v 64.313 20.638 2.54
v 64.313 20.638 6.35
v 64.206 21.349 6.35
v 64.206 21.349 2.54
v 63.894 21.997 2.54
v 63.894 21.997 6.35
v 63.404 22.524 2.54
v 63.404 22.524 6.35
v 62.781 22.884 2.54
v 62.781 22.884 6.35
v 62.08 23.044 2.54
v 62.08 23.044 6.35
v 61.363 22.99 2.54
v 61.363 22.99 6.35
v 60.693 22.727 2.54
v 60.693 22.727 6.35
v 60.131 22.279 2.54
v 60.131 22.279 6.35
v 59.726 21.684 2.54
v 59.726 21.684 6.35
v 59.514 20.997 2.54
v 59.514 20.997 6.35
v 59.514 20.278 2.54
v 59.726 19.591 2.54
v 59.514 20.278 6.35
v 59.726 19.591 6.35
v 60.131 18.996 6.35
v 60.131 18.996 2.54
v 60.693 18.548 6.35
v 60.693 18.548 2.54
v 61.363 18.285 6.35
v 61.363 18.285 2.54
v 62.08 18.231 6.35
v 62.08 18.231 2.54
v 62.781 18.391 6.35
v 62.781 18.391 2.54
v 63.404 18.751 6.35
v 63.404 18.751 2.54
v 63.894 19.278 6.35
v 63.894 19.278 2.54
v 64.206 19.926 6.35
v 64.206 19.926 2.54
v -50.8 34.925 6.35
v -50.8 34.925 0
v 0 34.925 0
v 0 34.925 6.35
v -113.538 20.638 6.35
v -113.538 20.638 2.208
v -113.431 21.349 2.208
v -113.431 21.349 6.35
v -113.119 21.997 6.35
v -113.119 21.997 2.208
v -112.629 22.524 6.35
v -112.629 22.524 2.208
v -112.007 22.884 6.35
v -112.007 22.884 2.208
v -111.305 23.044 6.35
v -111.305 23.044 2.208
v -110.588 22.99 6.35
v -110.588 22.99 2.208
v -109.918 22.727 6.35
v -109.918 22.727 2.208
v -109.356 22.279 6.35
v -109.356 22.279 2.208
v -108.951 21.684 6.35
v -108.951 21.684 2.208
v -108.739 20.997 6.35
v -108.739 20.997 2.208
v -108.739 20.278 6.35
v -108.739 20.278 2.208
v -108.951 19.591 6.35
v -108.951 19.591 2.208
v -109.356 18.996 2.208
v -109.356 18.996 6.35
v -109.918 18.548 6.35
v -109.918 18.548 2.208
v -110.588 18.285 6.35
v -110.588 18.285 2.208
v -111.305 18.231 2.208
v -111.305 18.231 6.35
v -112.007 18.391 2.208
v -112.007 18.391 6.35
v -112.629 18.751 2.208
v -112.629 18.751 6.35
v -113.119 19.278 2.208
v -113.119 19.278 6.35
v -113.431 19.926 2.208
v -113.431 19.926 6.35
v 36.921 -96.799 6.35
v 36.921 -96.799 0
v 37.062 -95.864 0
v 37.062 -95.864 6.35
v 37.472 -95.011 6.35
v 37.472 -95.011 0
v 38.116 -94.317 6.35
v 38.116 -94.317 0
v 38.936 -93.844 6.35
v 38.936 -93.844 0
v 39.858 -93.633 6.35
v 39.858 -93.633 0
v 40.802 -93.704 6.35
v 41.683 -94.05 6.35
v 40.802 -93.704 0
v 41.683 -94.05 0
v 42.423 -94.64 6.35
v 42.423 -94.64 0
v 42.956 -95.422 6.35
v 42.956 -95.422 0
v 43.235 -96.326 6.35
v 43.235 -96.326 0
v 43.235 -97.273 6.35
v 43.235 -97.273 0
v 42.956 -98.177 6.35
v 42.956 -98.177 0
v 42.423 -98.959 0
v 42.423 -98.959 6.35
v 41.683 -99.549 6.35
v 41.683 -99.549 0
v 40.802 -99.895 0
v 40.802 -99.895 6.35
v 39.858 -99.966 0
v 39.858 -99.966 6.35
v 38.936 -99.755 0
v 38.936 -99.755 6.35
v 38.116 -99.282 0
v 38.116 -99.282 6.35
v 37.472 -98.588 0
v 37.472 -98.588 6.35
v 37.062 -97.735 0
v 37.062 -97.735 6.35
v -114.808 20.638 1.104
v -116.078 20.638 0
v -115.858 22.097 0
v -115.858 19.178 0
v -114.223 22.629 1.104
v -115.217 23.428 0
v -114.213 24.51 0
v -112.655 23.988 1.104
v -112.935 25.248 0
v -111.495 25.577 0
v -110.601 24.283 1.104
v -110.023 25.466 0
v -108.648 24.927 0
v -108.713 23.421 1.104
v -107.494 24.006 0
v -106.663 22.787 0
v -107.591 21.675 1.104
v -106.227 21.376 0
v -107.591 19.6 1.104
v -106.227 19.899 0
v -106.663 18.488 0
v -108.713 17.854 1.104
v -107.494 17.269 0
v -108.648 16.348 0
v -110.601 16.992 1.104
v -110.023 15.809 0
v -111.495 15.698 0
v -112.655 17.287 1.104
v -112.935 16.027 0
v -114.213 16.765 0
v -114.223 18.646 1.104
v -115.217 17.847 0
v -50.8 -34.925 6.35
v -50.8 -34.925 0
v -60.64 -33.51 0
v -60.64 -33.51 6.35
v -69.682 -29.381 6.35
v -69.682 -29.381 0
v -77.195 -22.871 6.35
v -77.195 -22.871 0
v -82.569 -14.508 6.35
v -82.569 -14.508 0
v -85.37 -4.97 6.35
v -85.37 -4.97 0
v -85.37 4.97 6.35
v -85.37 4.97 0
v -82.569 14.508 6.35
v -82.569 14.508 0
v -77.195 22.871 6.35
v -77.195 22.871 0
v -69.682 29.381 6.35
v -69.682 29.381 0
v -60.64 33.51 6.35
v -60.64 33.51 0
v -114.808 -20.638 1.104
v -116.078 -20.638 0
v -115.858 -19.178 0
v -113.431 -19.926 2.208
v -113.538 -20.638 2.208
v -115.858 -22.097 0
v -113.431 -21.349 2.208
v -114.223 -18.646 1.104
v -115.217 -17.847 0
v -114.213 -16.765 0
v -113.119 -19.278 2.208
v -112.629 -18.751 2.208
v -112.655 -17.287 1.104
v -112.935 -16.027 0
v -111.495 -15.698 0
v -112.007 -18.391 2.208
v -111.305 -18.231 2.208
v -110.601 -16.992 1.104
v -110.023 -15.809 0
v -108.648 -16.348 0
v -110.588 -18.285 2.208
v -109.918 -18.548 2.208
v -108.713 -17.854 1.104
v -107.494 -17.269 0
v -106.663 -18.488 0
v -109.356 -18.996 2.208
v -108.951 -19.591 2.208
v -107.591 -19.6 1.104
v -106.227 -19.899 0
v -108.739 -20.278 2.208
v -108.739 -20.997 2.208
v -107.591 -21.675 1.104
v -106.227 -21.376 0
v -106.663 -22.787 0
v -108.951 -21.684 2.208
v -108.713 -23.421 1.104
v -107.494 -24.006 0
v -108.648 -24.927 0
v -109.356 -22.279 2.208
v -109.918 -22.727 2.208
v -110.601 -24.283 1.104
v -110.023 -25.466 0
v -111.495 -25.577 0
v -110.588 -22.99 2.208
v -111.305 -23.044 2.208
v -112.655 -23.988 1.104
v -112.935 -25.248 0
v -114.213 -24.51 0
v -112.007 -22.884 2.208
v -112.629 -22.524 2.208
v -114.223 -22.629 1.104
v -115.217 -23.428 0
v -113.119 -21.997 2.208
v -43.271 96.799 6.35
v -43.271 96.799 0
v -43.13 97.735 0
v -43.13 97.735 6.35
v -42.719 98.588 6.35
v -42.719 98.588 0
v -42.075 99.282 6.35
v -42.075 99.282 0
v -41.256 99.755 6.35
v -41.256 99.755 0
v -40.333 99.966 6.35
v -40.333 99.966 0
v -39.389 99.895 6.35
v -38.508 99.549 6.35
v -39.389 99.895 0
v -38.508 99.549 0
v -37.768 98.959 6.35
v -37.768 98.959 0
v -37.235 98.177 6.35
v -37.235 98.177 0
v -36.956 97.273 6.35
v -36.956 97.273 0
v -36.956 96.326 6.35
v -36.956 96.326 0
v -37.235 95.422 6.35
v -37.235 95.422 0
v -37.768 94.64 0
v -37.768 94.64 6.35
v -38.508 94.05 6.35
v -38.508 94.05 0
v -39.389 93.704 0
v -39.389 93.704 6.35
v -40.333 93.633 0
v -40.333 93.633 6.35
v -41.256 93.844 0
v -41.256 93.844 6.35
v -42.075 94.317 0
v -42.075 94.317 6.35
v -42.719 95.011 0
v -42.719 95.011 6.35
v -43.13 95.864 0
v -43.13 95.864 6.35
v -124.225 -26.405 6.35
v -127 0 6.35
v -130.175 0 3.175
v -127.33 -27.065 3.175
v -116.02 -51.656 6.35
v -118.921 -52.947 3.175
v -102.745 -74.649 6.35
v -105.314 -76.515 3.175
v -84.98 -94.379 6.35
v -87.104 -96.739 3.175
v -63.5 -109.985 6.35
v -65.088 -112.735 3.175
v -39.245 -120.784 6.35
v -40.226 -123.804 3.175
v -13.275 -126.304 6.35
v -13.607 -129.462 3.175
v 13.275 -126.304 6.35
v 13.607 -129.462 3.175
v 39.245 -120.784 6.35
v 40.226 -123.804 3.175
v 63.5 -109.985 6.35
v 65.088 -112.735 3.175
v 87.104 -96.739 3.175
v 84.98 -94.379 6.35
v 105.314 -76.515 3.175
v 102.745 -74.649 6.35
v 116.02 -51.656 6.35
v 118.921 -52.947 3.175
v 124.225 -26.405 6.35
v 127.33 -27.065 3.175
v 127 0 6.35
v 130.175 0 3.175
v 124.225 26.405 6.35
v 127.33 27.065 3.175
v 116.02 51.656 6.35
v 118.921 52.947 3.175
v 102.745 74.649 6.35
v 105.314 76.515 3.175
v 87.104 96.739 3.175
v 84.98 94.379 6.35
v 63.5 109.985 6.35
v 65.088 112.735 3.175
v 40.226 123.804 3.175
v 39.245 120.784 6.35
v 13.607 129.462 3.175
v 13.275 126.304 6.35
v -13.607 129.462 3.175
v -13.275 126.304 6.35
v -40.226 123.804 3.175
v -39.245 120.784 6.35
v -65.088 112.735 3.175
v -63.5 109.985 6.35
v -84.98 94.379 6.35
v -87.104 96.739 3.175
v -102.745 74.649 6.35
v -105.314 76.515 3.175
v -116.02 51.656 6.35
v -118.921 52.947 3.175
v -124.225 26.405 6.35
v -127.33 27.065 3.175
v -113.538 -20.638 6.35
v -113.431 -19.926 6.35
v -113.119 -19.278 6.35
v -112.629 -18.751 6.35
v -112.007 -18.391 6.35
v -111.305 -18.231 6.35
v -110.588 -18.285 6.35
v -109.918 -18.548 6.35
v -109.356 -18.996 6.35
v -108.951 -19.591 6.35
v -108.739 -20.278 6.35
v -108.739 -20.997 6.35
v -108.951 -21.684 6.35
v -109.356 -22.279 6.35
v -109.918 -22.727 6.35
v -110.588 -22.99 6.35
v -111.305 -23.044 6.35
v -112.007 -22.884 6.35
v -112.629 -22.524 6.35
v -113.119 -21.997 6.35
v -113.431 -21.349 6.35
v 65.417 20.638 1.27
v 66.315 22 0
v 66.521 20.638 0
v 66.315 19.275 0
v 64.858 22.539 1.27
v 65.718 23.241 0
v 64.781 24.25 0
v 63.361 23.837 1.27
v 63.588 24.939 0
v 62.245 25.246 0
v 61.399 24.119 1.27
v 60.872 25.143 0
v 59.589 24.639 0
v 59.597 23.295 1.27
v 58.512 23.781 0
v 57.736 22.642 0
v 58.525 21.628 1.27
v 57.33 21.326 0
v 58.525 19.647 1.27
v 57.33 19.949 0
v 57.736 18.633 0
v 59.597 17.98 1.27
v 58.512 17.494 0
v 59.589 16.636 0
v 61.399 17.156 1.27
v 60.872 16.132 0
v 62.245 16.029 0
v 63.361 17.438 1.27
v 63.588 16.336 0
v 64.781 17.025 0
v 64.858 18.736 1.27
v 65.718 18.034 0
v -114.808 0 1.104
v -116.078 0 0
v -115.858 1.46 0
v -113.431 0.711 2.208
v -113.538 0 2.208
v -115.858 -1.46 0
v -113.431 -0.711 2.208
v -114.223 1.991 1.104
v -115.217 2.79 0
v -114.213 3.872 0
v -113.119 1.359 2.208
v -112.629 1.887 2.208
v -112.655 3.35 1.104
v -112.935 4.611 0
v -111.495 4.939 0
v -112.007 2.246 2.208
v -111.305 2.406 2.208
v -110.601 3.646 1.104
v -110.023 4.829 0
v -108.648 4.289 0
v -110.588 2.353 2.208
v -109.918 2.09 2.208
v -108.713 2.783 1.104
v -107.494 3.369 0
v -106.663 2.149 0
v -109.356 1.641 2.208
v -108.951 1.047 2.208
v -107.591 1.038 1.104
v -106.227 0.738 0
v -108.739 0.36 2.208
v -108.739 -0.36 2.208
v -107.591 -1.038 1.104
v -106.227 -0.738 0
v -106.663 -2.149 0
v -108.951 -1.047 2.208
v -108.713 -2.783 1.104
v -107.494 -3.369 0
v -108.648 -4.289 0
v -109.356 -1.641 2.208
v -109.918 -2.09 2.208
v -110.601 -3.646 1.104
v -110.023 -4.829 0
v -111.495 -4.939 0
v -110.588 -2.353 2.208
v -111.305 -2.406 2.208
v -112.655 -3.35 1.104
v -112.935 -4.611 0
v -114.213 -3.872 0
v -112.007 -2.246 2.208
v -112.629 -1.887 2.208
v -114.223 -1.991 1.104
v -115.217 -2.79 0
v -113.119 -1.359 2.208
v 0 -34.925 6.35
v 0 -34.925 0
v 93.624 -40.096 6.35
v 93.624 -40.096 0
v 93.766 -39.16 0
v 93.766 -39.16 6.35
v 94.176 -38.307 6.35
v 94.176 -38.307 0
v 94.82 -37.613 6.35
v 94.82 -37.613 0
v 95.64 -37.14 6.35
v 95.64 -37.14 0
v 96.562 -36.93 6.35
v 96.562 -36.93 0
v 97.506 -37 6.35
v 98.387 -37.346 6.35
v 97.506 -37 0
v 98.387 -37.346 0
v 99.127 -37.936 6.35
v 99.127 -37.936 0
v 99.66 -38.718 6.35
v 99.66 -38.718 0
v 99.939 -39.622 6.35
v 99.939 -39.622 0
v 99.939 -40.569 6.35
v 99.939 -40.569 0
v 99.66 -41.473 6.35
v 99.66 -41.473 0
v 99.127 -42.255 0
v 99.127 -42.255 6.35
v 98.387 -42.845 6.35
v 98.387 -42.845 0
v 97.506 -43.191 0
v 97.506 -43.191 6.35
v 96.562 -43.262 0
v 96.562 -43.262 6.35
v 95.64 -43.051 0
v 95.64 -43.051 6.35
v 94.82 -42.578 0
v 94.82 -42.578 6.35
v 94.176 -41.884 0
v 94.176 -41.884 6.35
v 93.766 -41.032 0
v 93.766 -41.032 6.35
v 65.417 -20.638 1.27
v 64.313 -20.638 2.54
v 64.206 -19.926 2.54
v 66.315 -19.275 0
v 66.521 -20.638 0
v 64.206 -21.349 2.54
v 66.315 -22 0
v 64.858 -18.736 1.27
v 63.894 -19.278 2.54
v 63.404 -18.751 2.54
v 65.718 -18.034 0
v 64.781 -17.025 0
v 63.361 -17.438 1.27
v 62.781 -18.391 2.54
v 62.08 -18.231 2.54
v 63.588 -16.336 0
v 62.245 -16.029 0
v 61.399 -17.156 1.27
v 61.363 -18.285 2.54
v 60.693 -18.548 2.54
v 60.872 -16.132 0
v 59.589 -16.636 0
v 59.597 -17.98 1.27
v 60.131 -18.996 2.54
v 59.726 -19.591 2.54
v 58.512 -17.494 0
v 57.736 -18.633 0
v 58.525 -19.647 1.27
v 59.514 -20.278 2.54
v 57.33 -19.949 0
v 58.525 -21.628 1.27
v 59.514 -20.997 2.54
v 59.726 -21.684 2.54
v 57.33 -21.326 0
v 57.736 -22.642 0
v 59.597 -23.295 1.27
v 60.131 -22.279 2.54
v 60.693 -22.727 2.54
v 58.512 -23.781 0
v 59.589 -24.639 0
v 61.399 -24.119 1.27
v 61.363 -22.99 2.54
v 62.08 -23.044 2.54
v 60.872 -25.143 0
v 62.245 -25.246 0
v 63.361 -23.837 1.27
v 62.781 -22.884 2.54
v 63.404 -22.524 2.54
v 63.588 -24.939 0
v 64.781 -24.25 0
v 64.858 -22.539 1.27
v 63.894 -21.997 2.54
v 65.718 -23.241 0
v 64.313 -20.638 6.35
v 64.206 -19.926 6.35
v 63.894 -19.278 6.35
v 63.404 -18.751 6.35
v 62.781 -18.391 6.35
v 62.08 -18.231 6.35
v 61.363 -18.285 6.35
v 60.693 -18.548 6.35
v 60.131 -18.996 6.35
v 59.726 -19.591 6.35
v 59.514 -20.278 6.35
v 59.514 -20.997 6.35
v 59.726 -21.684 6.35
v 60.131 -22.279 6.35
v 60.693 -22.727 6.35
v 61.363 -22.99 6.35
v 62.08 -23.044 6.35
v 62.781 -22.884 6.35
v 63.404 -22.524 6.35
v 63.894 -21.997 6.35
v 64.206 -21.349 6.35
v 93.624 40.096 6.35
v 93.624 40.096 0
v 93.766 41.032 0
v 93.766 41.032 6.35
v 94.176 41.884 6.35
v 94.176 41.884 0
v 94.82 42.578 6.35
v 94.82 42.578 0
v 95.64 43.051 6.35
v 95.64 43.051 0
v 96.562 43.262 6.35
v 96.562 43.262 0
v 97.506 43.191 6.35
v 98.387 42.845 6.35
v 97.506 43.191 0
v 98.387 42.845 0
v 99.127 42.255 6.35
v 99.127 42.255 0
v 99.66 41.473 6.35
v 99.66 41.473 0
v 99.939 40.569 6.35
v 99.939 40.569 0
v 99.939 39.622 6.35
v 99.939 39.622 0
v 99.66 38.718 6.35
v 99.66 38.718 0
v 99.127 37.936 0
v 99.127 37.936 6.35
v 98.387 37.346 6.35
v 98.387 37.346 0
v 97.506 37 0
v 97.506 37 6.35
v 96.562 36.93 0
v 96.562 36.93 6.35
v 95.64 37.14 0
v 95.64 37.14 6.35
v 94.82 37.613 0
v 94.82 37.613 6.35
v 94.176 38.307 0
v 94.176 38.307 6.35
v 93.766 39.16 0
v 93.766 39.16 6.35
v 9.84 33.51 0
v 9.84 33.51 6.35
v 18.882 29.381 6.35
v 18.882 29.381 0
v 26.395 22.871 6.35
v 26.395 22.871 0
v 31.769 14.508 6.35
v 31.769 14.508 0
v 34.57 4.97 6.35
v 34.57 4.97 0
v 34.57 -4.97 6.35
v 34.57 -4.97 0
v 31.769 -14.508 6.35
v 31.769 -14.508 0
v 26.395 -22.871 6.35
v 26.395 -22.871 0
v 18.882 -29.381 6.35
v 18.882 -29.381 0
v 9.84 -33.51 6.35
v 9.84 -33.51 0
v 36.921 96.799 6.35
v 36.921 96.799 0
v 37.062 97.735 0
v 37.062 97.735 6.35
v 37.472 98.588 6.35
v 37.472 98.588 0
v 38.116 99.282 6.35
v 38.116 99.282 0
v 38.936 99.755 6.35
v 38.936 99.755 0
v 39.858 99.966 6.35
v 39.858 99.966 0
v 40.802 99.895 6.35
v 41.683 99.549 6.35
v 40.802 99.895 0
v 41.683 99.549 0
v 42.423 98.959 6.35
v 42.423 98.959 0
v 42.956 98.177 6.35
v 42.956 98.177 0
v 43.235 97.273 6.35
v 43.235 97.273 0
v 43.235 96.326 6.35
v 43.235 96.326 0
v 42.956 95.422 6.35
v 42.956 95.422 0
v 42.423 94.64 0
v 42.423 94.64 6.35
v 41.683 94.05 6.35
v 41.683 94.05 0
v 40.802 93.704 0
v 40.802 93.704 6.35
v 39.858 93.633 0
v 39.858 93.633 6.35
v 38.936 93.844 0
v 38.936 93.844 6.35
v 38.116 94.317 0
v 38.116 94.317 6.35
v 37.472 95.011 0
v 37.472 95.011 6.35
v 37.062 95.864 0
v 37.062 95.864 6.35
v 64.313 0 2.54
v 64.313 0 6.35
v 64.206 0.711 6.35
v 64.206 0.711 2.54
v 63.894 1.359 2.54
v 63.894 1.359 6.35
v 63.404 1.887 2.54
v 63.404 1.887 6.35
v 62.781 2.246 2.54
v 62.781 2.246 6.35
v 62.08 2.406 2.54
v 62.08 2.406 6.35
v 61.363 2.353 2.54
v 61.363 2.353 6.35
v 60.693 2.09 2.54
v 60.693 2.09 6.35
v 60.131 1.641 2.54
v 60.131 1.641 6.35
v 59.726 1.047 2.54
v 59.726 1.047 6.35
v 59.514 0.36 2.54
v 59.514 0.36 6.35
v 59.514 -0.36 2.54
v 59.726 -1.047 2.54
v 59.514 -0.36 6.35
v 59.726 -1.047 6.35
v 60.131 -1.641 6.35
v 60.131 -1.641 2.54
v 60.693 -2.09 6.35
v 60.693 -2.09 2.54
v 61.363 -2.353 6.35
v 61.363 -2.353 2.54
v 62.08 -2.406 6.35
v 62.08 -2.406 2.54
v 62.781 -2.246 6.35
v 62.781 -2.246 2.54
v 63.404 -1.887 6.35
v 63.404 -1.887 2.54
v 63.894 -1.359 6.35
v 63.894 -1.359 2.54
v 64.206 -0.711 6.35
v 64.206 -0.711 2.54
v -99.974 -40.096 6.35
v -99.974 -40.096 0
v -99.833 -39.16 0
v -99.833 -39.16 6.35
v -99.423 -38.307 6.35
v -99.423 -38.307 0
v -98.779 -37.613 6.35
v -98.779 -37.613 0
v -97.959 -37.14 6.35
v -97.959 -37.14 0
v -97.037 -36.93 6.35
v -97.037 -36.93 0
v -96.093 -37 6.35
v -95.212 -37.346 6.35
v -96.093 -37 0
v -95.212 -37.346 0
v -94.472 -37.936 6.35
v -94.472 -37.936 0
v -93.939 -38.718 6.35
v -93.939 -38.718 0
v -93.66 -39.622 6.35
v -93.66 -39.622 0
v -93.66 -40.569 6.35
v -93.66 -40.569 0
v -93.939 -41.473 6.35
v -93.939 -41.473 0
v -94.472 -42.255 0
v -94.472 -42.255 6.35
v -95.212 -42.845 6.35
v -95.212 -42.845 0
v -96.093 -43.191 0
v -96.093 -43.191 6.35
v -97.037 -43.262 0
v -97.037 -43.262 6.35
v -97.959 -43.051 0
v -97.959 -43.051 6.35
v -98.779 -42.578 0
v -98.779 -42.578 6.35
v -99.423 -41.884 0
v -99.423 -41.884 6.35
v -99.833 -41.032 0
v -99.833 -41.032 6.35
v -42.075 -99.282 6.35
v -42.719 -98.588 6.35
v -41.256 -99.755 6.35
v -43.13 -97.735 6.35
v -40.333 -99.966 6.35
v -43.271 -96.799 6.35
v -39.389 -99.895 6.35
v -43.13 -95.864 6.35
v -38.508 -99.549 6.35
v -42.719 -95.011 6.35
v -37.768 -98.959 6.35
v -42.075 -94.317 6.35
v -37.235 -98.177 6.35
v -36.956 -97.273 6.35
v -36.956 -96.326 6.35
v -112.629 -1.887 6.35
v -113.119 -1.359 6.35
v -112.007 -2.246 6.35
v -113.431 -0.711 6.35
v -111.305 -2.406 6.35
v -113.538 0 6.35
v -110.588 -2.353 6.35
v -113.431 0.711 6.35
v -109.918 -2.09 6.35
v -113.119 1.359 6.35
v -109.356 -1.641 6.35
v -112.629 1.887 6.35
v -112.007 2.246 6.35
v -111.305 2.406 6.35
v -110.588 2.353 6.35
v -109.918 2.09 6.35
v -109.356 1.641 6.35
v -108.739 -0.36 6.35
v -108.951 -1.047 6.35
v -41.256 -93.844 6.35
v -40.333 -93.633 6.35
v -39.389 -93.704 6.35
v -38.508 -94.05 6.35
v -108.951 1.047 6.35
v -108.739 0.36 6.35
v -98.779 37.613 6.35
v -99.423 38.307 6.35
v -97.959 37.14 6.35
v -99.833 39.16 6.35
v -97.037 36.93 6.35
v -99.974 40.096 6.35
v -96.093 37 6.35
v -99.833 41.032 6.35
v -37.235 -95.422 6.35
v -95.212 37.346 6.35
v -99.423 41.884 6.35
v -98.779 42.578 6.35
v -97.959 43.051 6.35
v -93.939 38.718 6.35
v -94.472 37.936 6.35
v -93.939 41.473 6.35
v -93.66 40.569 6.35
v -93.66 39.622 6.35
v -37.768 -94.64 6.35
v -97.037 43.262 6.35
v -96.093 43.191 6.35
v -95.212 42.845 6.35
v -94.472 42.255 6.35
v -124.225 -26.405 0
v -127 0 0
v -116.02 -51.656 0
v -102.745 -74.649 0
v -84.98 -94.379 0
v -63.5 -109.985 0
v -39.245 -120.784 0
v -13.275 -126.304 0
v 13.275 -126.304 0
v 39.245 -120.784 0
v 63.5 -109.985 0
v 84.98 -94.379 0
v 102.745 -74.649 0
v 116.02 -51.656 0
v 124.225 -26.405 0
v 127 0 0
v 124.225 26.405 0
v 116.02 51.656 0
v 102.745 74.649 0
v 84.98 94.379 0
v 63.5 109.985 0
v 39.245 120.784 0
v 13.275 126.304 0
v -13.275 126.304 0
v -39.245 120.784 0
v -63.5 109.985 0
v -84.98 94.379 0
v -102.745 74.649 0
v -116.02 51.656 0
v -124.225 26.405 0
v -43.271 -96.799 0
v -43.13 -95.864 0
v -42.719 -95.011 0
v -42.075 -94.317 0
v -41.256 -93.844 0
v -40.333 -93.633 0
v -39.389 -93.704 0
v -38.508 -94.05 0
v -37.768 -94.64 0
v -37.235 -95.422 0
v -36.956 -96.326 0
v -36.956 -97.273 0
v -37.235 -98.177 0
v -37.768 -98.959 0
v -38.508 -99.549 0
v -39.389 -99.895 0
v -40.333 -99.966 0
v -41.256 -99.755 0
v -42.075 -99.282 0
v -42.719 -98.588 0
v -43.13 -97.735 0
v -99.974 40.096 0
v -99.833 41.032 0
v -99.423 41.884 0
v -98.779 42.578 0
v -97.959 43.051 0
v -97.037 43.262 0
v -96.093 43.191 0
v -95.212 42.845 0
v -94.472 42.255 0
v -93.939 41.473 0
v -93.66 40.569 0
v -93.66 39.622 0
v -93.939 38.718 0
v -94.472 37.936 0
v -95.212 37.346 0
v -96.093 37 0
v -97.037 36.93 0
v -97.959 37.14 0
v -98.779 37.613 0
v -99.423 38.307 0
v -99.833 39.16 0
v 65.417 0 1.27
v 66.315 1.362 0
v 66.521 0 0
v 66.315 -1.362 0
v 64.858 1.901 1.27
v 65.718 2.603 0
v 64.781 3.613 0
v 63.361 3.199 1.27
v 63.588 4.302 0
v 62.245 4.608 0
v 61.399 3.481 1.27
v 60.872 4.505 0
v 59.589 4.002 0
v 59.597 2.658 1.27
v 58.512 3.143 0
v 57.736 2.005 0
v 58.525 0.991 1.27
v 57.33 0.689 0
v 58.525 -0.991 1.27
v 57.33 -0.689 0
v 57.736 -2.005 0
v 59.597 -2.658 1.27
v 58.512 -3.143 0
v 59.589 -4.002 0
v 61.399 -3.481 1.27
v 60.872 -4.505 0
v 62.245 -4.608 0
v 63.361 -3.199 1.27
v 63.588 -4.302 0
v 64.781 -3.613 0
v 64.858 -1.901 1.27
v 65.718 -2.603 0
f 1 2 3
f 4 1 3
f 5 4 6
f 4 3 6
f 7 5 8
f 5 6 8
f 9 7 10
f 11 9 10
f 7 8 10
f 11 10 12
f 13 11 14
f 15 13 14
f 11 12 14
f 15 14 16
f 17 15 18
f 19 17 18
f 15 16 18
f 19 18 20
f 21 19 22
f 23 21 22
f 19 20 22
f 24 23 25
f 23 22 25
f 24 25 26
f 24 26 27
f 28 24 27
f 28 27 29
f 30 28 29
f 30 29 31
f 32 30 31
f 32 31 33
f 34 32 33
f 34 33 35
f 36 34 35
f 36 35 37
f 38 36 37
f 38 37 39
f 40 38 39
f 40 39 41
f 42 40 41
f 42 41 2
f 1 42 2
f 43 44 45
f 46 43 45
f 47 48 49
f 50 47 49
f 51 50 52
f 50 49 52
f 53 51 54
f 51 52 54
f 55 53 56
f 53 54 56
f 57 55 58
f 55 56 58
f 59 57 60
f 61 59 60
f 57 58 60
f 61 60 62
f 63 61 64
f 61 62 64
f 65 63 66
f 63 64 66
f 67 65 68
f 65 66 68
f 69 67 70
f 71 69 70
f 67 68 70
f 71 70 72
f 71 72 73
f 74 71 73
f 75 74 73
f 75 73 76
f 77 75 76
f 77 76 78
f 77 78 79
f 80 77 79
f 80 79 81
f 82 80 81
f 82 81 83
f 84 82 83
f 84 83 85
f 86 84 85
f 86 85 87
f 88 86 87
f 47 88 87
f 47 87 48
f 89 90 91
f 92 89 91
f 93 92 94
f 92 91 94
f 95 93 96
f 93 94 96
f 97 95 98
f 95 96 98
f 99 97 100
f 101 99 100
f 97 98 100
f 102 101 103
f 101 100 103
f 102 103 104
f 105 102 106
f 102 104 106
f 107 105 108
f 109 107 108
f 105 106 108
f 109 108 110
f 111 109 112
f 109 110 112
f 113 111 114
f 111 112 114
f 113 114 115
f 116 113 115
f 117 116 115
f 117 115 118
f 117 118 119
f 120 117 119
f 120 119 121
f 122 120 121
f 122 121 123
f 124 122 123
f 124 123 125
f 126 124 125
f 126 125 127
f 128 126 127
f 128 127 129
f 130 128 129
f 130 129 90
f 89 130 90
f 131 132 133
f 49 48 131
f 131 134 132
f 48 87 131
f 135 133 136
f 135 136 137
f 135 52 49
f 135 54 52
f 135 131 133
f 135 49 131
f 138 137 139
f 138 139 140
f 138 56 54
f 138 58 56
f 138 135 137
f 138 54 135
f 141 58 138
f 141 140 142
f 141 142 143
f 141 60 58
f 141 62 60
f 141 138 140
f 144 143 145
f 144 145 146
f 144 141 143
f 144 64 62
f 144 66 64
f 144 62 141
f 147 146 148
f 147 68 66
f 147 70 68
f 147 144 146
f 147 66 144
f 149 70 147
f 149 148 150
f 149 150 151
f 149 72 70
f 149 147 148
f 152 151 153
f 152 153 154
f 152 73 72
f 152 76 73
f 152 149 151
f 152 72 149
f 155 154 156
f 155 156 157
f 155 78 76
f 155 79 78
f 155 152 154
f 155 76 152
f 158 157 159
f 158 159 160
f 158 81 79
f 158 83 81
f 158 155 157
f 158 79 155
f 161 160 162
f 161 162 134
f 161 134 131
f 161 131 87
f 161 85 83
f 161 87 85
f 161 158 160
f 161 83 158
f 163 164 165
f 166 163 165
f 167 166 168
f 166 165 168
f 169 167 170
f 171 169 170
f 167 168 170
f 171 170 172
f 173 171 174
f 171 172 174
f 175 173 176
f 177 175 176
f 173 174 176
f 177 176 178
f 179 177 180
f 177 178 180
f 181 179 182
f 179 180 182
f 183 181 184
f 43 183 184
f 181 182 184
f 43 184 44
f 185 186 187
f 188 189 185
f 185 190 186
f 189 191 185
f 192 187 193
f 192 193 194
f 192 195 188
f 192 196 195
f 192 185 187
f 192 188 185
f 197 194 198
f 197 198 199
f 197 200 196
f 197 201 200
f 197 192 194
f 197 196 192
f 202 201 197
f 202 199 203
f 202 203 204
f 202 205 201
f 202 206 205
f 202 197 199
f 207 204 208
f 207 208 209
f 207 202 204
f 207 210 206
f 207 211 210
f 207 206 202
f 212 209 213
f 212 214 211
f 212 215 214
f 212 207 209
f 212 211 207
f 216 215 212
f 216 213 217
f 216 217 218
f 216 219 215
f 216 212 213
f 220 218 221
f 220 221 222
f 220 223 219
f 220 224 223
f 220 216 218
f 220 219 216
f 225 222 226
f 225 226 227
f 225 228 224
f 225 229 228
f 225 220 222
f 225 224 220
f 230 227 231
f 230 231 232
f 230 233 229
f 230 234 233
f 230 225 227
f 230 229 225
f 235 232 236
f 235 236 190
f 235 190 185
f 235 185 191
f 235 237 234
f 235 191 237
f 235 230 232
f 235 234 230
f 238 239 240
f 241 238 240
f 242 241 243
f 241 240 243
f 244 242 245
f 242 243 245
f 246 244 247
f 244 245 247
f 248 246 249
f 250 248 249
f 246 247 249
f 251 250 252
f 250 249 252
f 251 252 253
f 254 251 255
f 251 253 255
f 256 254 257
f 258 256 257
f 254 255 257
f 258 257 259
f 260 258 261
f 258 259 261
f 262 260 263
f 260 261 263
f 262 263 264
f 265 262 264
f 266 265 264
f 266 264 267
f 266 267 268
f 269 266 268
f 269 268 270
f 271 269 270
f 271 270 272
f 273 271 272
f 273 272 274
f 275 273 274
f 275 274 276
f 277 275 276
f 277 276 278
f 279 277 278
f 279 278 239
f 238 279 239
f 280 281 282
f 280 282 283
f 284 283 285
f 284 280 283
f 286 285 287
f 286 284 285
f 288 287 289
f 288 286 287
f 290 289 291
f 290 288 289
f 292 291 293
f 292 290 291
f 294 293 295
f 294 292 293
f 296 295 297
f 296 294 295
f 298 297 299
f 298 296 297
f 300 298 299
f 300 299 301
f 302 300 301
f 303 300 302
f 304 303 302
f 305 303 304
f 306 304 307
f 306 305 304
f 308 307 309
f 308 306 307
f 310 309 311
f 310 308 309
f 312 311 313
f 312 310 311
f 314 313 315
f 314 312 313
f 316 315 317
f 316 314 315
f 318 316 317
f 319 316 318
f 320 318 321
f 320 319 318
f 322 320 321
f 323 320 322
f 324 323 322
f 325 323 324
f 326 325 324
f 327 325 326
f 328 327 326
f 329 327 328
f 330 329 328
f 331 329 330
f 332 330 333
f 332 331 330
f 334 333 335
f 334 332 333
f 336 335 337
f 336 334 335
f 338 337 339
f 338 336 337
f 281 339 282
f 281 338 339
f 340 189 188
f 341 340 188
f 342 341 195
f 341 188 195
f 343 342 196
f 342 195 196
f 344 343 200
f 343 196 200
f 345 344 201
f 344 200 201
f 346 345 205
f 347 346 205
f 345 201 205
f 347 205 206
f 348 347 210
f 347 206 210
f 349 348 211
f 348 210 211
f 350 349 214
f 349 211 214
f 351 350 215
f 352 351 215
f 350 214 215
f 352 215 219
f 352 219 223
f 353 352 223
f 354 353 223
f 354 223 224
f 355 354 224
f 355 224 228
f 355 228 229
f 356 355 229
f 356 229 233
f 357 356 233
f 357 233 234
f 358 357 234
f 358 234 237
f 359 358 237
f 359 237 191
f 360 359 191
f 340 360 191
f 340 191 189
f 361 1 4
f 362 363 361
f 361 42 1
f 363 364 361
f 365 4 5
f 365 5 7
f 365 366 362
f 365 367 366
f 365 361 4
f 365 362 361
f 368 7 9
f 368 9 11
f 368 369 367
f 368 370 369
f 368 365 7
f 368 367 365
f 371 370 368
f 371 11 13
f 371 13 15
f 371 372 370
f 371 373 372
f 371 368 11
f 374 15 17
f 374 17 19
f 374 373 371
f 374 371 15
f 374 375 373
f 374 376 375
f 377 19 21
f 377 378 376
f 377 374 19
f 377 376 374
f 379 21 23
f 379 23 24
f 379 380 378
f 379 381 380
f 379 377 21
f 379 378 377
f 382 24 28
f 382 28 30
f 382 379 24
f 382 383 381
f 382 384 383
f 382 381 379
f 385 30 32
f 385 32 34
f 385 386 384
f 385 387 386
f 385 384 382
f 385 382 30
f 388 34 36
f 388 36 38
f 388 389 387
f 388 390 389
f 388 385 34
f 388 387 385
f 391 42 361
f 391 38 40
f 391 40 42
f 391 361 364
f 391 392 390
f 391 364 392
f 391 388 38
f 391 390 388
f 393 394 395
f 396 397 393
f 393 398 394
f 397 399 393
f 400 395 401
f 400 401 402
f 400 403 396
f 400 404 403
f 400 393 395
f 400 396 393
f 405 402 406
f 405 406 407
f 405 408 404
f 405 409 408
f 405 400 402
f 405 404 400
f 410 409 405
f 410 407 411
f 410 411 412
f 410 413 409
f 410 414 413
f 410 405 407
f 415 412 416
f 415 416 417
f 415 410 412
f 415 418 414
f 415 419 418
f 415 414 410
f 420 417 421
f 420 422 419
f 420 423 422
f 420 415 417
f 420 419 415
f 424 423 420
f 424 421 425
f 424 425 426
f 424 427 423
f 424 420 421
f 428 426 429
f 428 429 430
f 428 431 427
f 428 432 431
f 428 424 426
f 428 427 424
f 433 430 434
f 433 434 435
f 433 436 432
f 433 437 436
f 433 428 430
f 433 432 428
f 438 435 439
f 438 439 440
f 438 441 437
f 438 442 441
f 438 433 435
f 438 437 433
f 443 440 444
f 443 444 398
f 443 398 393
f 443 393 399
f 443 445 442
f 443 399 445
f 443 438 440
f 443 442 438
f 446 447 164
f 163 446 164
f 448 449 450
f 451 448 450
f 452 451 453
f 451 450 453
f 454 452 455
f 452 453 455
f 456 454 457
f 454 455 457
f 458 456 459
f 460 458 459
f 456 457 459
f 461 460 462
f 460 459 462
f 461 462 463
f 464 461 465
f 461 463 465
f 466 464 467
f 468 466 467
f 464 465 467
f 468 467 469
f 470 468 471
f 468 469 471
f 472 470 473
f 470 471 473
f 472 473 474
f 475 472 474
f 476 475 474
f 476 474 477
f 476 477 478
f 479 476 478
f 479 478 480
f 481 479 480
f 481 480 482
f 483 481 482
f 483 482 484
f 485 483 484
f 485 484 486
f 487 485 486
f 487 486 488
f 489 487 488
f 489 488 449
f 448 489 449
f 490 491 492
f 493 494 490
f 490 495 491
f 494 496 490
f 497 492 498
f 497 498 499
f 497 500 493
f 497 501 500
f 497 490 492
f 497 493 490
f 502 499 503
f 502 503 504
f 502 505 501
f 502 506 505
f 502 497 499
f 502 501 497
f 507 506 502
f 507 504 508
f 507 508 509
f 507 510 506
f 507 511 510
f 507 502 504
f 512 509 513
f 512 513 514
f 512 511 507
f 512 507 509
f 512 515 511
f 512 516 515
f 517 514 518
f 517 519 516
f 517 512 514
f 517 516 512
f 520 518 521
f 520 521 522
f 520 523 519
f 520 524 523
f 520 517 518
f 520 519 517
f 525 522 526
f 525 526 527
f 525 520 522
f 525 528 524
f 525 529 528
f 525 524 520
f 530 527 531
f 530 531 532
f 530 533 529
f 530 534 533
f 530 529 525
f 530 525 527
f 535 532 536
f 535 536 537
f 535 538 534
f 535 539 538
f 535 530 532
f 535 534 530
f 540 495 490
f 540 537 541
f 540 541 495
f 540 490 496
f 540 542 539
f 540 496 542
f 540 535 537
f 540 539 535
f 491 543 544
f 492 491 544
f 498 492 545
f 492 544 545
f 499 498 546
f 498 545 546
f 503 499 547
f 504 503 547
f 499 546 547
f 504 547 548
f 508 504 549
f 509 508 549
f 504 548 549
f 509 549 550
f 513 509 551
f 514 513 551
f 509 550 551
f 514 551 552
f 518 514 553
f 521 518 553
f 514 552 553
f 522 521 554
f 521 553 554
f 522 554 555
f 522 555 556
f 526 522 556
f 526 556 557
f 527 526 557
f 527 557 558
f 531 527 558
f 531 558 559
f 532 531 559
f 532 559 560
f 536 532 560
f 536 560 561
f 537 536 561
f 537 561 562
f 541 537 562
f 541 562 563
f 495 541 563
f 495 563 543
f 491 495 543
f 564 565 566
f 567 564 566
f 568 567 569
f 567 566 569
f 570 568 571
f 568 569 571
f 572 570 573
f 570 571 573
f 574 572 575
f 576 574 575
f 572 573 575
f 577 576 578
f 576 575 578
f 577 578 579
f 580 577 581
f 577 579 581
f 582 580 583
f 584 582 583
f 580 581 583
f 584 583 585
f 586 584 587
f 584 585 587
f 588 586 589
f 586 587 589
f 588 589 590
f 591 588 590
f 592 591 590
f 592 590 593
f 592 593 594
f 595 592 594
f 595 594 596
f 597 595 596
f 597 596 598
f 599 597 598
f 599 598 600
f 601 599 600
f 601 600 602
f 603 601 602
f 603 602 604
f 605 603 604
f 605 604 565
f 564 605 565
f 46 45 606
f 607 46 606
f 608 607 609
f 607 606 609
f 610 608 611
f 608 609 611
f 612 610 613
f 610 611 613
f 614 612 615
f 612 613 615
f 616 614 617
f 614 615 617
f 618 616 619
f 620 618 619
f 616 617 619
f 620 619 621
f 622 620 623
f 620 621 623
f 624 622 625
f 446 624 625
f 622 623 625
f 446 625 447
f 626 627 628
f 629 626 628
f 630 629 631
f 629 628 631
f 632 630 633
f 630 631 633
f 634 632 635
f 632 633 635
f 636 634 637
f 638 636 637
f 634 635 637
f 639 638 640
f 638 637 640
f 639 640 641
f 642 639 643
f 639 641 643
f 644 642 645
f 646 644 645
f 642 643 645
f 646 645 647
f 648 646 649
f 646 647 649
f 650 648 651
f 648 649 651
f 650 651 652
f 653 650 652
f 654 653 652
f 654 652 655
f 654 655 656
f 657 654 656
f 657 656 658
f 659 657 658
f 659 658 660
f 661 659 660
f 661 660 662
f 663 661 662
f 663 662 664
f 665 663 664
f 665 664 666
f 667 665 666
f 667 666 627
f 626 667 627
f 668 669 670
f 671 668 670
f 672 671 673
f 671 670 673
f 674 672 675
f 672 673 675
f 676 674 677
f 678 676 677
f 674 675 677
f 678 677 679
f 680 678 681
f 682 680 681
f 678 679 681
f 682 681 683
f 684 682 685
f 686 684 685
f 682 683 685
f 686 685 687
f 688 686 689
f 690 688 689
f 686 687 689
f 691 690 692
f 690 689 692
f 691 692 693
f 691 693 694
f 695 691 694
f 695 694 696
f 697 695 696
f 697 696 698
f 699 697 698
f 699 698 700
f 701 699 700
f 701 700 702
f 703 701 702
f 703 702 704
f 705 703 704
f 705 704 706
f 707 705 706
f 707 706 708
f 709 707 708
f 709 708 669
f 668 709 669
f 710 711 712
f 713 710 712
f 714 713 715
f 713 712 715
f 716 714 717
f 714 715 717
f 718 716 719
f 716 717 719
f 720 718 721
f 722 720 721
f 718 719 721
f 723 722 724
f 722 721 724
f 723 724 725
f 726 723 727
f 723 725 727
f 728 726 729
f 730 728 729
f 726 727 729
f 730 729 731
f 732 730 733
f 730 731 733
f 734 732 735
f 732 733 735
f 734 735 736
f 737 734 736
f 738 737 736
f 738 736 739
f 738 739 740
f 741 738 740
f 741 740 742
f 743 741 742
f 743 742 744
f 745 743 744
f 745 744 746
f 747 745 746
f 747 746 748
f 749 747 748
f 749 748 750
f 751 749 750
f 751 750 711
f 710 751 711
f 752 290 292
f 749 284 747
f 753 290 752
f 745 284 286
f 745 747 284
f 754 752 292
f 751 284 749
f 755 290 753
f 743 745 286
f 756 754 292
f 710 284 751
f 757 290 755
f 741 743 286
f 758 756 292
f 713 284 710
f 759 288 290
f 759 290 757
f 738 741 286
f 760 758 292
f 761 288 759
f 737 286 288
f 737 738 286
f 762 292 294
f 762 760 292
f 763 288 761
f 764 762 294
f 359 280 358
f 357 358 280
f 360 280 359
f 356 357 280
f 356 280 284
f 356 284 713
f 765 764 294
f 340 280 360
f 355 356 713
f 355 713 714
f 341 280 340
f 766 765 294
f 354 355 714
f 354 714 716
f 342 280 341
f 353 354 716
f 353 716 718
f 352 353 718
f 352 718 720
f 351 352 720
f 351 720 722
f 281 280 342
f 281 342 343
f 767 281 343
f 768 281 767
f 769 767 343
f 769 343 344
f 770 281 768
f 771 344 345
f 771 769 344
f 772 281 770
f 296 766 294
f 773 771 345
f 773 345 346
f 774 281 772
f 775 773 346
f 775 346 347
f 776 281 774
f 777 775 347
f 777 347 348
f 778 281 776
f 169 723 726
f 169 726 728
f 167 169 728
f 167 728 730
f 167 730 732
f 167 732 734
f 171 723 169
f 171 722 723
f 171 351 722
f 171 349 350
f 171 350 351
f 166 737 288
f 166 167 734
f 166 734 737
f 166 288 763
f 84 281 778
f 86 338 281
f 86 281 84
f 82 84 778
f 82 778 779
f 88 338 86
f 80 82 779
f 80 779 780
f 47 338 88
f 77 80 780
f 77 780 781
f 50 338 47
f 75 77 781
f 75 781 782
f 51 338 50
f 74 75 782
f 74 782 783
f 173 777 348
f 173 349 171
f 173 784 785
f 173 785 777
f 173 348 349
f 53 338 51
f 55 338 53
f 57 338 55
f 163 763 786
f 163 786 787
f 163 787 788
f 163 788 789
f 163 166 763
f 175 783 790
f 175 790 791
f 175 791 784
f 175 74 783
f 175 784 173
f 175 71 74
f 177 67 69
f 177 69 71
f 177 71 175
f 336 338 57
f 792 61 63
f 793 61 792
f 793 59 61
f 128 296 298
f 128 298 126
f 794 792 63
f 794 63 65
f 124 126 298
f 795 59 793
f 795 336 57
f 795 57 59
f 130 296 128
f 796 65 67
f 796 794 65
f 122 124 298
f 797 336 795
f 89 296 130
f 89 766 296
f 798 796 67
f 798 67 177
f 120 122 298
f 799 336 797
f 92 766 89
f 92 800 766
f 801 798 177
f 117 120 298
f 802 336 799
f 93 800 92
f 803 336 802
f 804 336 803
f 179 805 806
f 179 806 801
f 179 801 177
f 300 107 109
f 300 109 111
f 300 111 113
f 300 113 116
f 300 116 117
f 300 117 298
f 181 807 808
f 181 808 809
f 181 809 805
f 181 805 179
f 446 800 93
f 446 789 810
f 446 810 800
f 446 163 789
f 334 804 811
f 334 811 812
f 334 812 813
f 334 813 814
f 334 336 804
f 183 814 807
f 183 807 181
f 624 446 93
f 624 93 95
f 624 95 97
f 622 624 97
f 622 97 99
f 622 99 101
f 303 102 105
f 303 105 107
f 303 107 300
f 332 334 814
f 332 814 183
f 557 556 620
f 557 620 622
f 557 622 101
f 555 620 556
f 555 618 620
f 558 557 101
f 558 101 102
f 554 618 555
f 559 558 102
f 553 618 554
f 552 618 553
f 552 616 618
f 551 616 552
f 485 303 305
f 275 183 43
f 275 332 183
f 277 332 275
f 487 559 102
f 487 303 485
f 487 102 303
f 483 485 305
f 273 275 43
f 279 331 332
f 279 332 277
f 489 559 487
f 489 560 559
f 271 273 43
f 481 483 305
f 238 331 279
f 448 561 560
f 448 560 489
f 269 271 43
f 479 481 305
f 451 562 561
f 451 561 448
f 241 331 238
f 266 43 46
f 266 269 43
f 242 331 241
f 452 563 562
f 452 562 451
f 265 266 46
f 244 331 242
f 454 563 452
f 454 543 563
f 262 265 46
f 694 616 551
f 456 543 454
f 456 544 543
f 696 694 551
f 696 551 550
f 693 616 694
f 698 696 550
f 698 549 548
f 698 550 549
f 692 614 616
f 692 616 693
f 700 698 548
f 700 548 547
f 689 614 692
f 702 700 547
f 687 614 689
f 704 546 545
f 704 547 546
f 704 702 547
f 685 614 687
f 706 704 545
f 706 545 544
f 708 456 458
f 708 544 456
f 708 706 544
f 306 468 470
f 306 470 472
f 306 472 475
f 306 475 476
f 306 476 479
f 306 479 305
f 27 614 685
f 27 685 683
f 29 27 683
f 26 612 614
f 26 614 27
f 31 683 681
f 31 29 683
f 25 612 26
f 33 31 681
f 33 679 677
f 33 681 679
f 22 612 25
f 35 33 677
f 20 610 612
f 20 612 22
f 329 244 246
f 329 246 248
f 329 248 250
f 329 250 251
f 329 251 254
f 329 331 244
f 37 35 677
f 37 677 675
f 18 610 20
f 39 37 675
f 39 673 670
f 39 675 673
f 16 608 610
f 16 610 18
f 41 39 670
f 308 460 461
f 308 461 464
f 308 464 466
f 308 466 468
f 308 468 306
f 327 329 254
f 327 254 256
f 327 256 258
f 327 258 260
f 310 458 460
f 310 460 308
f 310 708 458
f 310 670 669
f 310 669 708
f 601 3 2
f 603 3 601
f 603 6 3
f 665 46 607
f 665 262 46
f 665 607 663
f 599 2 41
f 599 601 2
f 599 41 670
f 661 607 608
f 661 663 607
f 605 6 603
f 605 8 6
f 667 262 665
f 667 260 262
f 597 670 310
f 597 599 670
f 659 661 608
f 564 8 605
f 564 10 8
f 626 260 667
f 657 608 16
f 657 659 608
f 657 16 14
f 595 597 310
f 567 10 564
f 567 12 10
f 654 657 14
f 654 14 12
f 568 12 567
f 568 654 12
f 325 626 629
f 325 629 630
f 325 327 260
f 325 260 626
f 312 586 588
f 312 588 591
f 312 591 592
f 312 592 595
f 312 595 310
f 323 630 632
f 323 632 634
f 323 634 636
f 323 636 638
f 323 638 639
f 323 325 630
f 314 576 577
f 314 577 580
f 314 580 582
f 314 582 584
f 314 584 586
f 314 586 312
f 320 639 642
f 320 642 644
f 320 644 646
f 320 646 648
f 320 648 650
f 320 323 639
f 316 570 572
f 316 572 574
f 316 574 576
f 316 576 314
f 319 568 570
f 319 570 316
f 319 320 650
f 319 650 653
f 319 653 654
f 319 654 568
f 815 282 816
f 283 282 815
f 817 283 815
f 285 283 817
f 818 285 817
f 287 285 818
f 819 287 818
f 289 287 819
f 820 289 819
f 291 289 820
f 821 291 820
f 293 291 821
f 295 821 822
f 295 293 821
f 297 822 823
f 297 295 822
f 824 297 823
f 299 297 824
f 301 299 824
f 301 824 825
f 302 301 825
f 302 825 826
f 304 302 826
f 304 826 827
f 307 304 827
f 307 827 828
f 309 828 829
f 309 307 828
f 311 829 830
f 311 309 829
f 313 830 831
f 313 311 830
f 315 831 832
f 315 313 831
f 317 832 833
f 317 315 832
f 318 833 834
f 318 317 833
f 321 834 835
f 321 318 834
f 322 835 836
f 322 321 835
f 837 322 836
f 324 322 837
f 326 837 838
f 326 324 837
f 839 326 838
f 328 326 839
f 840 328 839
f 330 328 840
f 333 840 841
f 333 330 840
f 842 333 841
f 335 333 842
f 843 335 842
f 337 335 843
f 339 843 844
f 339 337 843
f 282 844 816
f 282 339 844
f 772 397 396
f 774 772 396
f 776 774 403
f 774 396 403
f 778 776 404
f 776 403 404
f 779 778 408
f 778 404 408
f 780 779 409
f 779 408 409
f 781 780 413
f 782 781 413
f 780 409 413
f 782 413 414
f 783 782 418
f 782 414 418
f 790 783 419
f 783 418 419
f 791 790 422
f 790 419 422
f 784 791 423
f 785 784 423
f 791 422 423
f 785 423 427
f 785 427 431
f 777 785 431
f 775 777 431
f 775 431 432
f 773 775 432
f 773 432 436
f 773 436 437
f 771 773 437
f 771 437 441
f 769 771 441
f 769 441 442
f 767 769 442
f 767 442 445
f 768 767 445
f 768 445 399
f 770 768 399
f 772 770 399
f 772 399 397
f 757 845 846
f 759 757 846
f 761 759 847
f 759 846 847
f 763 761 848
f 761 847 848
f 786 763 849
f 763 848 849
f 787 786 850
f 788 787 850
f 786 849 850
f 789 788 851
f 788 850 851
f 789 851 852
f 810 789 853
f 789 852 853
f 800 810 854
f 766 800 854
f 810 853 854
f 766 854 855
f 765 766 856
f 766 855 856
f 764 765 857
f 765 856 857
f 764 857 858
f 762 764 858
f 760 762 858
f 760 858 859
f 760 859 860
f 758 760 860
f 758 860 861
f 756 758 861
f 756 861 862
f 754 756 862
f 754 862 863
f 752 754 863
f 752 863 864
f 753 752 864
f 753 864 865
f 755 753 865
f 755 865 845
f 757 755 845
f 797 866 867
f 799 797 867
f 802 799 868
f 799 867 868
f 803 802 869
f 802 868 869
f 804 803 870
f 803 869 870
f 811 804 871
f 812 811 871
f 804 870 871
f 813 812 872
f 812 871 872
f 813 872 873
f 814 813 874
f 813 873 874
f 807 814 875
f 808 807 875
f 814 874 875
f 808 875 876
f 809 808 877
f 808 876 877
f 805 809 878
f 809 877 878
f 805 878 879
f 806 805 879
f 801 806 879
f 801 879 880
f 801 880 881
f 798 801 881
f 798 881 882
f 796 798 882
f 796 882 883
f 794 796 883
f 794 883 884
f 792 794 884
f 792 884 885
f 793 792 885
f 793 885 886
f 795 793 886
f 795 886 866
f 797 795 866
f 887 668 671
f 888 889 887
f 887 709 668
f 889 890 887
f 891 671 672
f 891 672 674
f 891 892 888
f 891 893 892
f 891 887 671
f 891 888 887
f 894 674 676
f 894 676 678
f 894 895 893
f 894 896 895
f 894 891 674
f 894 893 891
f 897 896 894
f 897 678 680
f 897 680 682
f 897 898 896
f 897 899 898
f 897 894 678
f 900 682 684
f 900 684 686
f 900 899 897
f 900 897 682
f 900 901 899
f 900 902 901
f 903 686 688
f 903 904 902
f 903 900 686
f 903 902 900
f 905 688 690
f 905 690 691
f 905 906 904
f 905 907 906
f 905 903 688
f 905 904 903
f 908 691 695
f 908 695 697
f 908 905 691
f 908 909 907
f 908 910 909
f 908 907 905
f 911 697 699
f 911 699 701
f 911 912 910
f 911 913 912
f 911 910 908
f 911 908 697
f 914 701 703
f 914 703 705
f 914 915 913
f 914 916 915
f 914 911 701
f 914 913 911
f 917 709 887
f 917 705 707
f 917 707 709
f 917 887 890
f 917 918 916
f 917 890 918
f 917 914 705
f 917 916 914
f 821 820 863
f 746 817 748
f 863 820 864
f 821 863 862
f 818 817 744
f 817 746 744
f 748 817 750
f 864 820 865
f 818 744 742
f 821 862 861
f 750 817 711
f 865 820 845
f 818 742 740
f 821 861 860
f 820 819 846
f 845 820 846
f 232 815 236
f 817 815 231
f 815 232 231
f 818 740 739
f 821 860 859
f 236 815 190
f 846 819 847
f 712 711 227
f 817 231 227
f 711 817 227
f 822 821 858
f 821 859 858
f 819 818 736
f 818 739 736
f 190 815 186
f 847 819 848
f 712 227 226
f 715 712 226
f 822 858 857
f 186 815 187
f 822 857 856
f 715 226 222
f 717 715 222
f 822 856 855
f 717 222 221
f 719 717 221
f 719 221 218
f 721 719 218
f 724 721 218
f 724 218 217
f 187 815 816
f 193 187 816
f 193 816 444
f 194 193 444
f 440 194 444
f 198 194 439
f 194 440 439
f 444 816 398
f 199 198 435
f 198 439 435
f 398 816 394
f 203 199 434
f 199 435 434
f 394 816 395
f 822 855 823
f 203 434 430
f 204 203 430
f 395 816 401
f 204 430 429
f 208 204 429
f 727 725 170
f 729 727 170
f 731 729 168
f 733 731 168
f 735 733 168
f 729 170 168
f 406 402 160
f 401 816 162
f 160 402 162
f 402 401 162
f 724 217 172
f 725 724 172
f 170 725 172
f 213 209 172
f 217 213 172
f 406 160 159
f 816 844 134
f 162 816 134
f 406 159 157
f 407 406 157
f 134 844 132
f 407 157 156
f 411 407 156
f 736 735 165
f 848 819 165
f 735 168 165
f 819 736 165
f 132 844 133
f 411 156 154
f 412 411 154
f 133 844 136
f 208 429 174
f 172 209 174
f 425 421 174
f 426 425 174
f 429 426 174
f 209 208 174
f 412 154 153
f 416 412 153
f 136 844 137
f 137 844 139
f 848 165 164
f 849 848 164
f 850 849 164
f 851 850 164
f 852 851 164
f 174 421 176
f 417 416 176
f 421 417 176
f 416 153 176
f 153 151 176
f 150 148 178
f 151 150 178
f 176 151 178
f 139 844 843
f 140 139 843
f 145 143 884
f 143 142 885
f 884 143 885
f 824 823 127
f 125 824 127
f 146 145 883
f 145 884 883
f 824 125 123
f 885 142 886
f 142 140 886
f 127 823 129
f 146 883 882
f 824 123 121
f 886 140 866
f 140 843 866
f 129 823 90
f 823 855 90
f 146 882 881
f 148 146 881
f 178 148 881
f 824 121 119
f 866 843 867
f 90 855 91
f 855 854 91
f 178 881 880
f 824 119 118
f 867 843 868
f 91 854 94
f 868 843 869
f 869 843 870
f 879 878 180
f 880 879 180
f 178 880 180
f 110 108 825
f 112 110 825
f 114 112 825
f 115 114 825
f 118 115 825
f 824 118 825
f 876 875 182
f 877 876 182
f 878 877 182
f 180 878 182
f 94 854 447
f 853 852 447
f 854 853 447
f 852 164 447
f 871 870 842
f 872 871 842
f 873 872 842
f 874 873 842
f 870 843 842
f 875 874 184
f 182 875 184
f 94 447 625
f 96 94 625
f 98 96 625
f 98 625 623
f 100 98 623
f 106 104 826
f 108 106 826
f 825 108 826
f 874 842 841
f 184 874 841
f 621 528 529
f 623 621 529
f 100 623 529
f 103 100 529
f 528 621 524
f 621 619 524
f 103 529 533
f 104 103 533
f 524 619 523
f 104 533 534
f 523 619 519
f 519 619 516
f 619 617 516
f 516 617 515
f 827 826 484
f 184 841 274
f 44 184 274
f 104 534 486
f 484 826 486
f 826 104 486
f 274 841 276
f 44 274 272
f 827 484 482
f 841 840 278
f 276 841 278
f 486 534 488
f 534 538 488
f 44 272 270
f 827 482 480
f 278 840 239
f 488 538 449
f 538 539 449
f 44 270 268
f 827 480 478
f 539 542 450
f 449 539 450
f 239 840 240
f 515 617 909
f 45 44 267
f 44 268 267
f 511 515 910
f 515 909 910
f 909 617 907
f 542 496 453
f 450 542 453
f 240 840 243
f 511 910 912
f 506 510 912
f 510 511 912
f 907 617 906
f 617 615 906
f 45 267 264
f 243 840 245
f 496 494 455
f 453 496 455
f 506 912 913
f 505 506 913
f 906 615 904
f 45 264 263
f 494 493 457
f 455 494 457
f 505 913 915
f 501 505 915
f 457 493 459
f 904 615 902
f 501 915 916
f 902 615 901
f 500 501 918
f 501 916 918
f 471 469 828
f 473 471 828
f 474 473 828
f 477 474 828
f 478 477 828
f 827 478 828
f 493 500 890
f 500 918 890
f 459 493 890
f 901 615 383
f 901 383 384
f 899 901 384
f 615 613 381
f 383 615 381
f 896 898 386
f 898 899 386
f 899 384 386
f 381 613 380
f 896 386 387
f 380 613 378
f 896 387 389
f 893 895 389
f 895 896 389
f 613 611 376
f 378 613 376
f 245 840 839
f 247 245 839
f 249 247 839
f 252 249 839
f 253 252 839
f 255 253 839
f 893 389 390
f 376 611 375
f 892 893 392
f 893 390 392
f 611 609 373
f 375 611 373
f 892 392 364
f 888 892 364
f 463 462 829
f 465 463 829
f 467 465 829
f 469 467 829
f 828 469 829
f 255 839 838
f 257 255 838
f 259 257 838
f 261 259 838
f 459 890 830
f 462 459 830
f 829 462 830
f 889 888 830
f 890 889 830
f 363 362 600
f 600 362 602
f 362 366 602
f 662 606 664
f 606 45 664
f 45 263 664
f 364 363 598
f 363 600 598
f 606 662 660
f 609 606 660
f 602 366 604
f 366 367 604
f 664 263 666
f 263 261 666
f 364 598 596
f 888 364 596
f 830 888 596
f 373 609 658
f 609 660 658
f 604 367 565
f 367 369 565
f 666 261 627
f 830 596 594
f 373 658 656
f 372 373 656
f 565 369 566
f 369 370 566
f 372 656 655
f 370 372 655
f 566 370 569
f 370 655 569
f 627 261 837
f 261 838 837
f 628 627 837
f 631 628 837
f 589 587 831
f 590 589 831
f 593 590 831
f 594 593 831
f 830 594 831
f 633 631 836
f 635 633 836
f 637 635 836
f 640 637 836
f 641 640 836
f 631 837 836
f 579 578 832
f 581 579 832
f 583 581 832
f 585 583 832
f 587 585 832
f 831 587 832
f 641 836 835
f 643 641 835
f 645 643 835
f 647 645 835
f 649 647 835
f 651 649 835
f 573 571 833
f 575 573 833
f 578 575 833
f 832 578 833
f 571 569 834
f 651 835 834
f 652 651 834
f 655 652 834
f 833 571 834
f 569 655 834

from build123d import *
from OCP.BRepFilletAPI import BRepFilletAPI_MakeChamfer

# Parameters (mm, degrees)
SKETCH1_R           = 152.4
BOSS_EXTRUDE1_DEPTH = 6.35
SKETCH2_R           = 2.413
CUT_EXTRUDE1_DEPTH  = 10.16
SKETCH4_R           = 2.413
CUT_EXTRUDE2_DEPTH  = 7.62
CHAMFER1_SIZE       = 2.54
CHAMFER1_SIZE2      = 2.207988314
SKETCH6_R           = 152.4
SKETCH6_R_2         = 127
CUT_EXTRUDE3_DEPTH  = 7.62
SKETCH7_R           = 3.175
CUT_EXTRUDE4_DEPTH  = 15.24


with BuildPart() as part:
    # Sketch1 → Boss-Extrude1 (new body)
    with BuildSketch(Plane.XY):
        Circle(SKETCH1_R)
        with BuildLine():
            ThreePointArc((-5e-08, 34.925), (34.925, -5.6e-08), (-1.61e-07, -34.925))
            Line((-1.61e-07, -34.925), (-50.8, -34.925))
            ThreePointArc((-50.8, -34.925), (-85.725, 0), (-50.8, 34.925))
            Line((-50.8, 34.925), (-5e-08, 34.925))
        make_face(mode=Mode.SUBTRACT)
    extrude(amount=BOSS_EXTRUDE1_DEPTH)

    # Sketch2 → Cut-Extrude1 (cut)
    with BuildSketch(Plane(origin=(0, 0, 0), x_dir=(-1, 0, 0), z_dir=(0, 0, -1))):
        with Locations((111.125, 20.6375)):
            Circle(SKETCH2_R)
        with Locations((111.125, 0)):
            Circle(SKETCH2_R)
        with Locations((111.125, -20.6375)):
            Circle(SKETCH2_R)
    extrude(amount=-CUT_EXTRUDE1_DEPTH, mode=Mode.SUBTRACT)

    # Sketch4 → Cut-Extrude2 (cut)
    with BuildSketch(Plane.XY.offset(6.35)):
        with Locations((61.8998, 20.6375)):
            Circle(SKETCH4_R)
        with Locations((61.8998, 0)):
            Circle(SKETCH4_R)
        with Locations((61.8998, -20.6375)):
            Circle(SKETCH4_R)
    extrude(amount=-CUT_EXTRUDE2_DEPTH, mode=Mode.SUBTRACT)

    # Chamfer1: one chamfer whose edges measure the first distance from different faces: ONE call of the kernel's chamfer builder (chamfer() names one face for all edges)
    chamfer1_edges_1 = [part.edges().sort_by_distance(p)[0] for p in [
        (-108.712, 20.6375, 0),
        (-108.712, 0, 0),
        (-108.712, -20.6375, 0),
    ]]
    chamfer1_side_1 = [part.faces().sort_by_distance(p)[0] for p in [
        (-148.089477062, 0, 0),
    ]]
    chamfer1_edges_2 = [part.edges().sort_by_distance(p)[0] for p in [
        (59.4868, 20.6375, 0),
    ]]
    chamfer1_side_2 = [part.faces().sort_by_distance(p)[0] for p in [
        (59.4868, 20.6375, 3.175),
    ]]
    chamfer1_edges_3 = [part.edges().sort_by_distance(p)[0] for p in [
        (59.4868, 0, 0),
    ]]
    chamfer1_side_3 = [part.faces().sort_by_distance(p)[0] for p in [
        (59.4868, 0, 3.175),
    ]]
    chamfer1_edges_4 = [part.edges().sort_by_distance(p)[0] for p in [
        (59.4868, -20.6375, 0),
    ]]
    chamfer1_side_4 = [part.faces().sort_by_distance(p)[0] for p in [
        (59.4868, -20.6375, 3.175),
    ]]
    chamfer1 = BRepFilletAPI_MakeChamfer(part.part.solid().wrapped)
    for e in chamfer1_edges_1:
        chamfer1.Add(CHAMFER1_SIZE, CHAMFER1_SIZE2, e.wrapped, chamfer1_side_1[0].wrapped)  # the first distance lies on this face
    for e in chamfer1_edges_2:
        chamfer1.Add(CHAMFER1_SIZE, CHAMFER1_SIZE2, e.wrapped, chamfer1_side_2[0].wrapped)  # the first distance lies on this face
    for e in chamfer1_edges_3:
        chamfer1.Add(CHAMFER1_SIZE, CHAMFER1_SIZE2, e.wrapped, chamfer1_side_3[0].wrapped)  # the first distance lies on this face
    for e in chamfer1_edges_4:
        chamfer1.Add(CHAMFER1_SIZE, CHAMFER1_SIZE2, e.wrapped, chamfer1_side_4[0].wrapped)  # the first distance lies on this face
    add(Compound.cast(chamfer1.Shape()), mode=Mode.REPLACE)

    # Sketch6 → Cut-Extrude3 (cut)
    with BuildSketch(Plane(origin=(0, 0, 0), x_dir=(-1, 0, 0), z_dir=(0, 0, -1))):
        Circle(SKETCH6_R)
        Circle(SKETCH6_R_2, mode=Mode.SUBTRACT)
    extrude(amount=-CUT_EXTRUDE3_DEPTH, mode=Mode.SUBTRACT)

    # Sketch5 → Revolve1 (revolve)
    with BuildSketch(Plane(origin=(0, 0, 0), x_dir=(1, 0, 0), z_dir=(0, 1, 0))):
        Polygon((-127, -6.35), (-127, 0), (-130.175, -3.175), align=None)
    revolve(axis=Axis((0, 0, 0), (0, 0, 1)))

    # Sketch7 → Cut-Extrude4 (cut)
    with BuildSketch(Plane(origin=(0, 0, 0), x_dir=(-1, 0, 0), z_dir=(0, 0, -1))):
        with Locations((40.095656626, 96.799478019)):
            Circle(SKETCH7_R)
        with Locations((96.799478019, 40.095656626)):
            Circle(SKETCH7_R)
        with Locations((96.799478019, -40.095656626)):
            Circle(SKETCH7_R)
        with Locations((40.095656626, -96.799478019)):
            Circle(SKETCH7_R)
        with Locations((-40.095656626, -96.799478019)):
            Circle(SKETCH7_R)
        with Locations((-96.799478019, -40.095656626)):
            Circle(SKETCH7_R)
        with Locations((-96.799478019, 40.095656626)):
            Circle(SKETCH7_R)
        with Locations((-40.095656626, 96.799478019)):
            Circle(SKETCH7_R)
    extrude(amount=-CUT_EXTRUDE4_DEPTH, mode=Mode.SUBTRACT)


solid = part.part
